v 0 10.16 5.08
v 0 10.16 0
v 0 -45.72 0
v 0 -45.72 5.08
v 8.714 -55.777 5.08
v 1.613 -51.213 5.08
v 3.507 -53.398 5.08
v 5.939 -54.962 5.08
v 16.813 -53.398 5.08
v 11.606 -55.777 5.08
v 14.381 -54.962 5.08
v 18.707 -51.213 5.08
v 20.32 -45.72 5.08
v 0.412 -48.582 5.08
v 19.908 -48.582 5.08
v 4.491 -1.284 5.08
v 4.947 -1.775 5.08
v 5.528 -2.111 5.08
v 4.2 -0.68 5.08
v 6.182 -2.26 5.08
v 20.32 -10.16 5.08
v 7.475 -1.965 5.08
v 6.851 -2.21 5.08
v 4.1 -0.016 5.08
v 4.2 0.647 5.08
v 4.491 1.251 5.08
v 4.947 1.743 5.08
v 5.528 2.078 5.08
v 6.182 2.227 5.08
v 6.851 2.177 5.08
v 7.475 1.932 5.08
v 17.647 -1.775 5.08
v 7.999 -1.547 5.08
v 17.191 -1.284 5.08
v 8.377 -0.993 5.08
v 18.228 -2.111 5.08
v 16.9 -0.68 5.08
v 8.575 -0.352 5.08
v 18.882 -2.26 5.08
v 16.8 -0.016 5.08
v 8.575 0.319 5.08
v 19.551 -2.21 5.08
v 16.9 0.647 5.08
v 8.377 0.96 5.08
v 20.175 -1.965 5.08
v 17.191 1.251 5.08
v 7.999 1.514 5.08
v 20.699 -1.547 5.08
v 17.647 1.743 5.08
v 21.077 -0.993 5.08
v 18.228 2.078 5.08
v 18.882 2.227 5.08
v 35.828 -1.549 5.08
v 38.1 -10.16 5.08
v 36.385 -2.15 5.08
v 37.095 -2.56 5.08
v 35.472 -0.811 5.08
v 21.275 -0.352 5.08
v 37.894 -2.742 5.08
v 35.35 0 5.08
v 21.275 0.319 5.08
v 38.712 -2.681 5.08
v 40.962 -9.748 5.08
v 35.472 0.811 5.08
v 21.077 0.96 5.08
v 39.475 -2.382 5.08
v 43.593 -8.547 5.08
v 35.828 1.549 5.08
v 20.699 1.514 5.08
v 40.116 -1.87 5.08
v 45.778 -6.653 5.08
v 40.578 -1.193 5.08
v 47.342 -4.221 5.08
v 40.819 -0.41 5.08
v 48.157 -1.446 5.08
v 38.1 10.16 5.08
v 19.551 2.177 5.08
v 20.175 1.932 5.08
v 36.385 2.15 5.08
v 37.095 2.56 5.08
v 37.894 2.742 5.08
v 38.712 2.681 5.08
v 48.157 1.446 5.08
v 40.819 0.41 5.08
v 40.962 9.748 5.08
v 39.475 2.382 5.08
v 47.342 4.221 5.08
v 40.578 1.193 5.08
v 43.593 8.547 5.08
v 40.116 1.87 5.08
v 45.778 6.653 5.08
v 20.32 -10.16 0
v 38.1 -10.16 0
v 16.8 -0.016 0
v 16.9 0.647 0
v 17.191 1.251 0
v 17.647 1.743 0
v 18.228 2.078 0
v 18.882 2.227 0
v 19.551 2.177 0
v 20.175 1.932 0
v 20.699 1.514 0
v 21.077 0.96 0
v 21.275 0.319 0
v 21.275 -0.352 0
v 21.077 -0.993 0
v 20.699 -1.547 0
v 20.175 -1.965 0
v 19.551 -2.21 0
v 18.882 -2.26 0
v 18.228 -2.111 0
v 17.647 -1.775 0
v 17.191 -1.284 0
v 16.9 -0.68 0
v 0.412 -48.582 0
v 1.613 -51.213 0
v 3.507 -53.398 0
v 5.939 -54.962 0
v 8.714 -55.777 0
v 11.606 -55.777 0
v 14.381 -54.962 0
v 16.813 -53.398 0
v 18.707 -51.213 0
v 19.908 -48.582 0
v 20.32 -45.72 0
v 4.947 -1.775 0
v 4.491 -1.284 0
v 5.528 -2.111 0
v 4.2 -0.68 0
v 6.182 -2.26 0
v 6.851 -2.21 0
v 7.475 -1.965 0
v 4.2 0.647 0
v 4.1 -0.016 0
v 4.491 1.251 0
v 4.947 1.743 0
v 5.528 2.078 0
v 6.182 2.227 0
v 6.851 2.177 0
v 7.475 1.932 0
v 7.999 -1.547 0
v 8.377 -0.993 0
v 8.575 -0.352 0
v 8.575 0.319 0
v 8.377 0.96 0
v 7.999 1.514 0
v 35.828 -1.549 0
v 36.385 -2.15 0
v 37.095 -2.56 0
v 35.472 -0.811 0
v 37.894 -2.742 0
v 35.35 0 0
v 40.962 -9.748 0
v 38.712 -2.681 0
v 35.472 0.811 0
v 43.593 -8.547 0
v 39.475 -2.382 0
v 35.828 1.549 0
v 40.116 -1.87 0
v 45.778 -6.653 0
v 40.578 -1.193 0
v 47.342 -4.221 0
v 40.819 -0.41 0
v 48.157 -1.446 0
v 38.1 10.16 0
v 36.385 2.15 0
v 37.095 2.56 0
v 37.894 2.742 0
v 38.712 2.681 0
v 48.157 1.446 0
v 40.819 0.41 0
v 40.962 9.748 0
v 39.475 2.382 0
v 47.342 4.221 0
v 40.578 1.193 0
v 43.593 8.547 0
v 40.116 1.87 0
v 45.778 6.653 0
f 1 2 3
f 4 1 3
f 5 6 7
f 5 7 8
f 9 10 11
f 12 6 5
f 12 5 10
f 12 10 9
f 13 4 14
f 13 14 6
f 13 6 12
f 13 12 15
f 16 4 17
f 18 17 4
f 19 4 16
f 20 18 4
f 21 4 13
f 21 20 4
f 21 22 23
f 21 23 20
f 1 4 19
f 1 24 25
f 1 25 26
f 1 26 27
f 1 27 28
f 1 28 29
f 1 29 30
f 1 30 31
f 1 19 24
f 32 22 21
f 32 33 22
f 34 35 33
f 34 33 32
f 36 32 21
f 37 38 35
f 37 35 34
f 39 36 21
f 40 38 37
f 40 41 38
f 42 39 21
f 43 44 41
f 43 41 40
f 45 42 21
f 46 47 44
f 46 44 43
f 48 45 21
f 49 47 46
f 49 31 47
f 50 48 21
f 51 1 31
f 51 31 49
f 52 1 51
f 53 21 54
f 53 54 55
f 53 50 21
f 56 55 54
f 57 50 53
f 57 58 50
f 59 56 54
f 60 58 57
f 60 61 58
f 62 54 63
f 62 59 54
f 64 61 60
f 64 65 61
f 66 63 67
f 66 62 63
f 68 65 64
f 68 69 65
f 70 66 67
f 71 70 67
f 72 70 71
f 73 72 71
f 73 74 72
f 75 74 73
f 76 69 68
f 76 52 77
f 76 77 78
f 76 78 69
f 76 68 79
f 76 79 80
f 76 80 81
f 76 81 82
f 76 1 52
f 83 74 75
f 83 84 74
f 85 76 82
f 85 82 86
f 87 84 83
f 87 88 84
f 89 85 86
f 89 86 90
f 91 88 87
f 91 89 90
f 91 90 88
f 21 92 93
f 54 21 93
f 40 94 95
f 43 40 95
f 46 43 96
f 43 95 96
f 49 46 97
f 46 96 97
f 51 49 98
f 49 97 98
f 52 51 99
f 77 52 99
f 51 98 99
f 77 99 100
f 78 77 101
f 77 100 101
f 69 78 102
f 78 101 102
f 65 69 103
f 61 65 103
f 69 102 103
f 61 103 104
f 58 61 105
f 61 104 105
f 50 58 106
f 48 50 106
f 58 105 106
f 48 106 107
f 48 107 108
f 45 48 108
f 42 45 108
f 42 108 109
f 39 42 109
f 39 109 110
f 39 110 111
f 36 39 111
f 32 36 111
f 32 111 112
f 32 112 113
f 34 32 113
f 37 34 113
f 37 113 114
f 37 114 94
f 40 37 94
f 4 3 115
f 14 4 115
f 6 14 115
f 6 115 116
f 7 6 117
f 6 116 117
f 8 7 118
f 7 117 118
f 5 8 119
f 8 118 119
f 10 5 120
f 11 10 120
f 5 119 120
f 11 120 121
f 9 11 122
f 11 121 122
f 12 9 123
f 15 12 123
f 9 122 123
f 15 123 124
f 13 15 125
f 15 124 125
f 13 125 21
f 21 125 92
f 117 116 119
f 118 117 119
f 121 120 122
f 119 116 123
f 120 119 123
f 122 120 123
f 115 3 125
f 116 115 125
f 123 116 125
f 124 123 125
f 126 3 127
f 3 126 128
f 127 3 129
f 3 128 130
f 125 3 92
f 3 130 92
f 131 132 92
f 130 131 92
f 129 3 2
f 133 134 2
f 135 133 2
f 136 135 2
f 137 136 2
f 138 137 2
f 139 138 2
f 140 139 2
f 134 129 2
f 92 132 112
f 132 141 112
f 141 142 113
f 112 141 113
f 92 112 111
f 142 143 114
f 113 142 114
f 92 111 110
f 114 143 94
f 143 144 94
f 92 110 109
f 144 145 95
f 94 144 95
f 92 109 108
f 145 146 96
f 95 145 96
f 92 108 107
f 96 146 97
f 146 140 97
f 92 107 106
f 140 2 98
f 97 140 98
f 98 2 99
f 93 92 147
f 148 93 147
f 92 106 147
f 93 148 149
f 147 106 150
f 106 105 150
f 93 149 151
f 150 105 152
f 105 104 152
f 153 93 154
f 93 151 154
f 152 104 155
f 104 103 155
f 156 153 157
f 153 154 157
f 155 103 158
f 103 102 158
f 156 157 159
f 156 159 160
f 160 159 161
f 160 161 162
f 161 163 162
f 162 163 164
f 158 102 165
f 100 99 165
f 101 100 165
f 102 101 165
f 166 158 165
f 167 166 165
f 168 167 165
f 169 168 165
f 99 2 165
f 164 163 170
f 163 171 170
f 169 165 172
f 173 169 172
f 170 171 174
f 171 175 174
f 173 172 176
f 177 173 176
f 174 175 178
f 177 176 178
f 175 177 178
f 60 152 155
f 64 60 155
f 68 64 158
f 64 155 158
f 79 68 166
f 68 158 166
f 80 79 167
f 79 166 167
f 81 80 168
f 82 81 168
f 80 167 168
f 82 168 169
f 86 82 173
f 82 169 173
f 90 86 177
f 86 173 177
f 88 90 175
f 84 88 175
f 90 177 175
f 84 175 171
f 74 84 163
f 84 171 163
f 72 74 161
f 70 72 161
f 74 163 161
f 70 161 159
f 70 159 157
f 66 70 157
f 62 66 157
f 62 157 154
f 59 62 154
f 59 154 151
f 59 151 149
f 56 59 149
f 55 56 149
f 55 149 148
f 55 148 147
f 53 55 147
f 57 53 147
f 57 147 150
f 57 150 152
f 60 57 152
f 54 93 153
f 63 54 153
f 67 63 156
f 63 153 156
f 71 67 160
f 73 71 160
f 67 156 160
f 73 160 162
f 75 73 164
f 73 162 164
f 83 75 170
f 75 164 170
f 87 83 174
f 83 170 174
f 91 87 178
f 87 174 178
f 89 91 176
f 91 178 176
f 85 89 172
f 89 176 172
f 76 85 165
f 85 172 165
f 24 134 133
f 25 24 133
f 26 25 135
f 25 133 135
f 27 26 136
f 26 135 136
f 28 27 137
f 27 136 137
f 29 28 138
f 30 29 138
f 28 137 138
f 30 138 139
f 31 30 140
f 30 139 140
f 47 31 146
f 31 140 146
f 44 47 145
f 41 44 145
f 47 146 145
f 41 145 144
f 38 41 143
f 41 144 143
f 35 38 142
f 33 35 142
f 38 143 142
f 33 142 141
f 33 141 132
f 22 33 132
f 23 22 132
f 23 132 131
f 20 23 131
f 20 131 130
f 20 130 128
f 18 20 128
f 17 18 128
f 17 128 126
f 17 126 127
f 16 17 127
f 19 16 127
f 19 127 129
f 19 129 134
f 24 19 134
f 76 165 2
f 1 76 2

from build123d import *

# Parameters (mm, degrees)
BOSS_EXTRUDE1_DEPTH  = 5.08
M5_CLEARANCE_HOLE1_D = 5.5
M4_CLEARANCE_HOLE1_D = 4.5


with BuildPart() as part:
    # Sketch1 → Boss-Extrude1 (new body)
    with BuildSketch(Plane.XY):
        with BuildLine():
            Line((0, 10.16), (0, -10.16))
            Line((0, -10.16), (0, -45.72))
            ThreePointArc((0, -45.72), (10.16, -55.88), (20.32, -45.72))
            Line((20.32, -45.72), (20.32, -10.16))
            Line((20.32, -10.16), (38.1, -10.16))
            ThreePointArc((38.1, -10.16), (48.26, 0), (38.1, 10.16))
            Line((38.1, 10.16), (0, 10.16))
        make_face()
    extrude(amount=BOSS_EXTRUDE1_DEPTH)

    # M5 Clearance Hole1 (through all)
    with Locations(Plane.XY.offset(5.08)):
        with Locations((38.1, 0)):
            Hole(M5_CLEARANCE_HOLE1_D / 2)

    # M4 Clearance Hole1 (through all)
    with Locations(Plane.XY.offset(5.08)):
        with Locations((19.05, -0.016311357), (6.35, -0.016311357)):
            Hole(M4_CLEARANCE_HOLE1_D / 2)


solid = part.part
